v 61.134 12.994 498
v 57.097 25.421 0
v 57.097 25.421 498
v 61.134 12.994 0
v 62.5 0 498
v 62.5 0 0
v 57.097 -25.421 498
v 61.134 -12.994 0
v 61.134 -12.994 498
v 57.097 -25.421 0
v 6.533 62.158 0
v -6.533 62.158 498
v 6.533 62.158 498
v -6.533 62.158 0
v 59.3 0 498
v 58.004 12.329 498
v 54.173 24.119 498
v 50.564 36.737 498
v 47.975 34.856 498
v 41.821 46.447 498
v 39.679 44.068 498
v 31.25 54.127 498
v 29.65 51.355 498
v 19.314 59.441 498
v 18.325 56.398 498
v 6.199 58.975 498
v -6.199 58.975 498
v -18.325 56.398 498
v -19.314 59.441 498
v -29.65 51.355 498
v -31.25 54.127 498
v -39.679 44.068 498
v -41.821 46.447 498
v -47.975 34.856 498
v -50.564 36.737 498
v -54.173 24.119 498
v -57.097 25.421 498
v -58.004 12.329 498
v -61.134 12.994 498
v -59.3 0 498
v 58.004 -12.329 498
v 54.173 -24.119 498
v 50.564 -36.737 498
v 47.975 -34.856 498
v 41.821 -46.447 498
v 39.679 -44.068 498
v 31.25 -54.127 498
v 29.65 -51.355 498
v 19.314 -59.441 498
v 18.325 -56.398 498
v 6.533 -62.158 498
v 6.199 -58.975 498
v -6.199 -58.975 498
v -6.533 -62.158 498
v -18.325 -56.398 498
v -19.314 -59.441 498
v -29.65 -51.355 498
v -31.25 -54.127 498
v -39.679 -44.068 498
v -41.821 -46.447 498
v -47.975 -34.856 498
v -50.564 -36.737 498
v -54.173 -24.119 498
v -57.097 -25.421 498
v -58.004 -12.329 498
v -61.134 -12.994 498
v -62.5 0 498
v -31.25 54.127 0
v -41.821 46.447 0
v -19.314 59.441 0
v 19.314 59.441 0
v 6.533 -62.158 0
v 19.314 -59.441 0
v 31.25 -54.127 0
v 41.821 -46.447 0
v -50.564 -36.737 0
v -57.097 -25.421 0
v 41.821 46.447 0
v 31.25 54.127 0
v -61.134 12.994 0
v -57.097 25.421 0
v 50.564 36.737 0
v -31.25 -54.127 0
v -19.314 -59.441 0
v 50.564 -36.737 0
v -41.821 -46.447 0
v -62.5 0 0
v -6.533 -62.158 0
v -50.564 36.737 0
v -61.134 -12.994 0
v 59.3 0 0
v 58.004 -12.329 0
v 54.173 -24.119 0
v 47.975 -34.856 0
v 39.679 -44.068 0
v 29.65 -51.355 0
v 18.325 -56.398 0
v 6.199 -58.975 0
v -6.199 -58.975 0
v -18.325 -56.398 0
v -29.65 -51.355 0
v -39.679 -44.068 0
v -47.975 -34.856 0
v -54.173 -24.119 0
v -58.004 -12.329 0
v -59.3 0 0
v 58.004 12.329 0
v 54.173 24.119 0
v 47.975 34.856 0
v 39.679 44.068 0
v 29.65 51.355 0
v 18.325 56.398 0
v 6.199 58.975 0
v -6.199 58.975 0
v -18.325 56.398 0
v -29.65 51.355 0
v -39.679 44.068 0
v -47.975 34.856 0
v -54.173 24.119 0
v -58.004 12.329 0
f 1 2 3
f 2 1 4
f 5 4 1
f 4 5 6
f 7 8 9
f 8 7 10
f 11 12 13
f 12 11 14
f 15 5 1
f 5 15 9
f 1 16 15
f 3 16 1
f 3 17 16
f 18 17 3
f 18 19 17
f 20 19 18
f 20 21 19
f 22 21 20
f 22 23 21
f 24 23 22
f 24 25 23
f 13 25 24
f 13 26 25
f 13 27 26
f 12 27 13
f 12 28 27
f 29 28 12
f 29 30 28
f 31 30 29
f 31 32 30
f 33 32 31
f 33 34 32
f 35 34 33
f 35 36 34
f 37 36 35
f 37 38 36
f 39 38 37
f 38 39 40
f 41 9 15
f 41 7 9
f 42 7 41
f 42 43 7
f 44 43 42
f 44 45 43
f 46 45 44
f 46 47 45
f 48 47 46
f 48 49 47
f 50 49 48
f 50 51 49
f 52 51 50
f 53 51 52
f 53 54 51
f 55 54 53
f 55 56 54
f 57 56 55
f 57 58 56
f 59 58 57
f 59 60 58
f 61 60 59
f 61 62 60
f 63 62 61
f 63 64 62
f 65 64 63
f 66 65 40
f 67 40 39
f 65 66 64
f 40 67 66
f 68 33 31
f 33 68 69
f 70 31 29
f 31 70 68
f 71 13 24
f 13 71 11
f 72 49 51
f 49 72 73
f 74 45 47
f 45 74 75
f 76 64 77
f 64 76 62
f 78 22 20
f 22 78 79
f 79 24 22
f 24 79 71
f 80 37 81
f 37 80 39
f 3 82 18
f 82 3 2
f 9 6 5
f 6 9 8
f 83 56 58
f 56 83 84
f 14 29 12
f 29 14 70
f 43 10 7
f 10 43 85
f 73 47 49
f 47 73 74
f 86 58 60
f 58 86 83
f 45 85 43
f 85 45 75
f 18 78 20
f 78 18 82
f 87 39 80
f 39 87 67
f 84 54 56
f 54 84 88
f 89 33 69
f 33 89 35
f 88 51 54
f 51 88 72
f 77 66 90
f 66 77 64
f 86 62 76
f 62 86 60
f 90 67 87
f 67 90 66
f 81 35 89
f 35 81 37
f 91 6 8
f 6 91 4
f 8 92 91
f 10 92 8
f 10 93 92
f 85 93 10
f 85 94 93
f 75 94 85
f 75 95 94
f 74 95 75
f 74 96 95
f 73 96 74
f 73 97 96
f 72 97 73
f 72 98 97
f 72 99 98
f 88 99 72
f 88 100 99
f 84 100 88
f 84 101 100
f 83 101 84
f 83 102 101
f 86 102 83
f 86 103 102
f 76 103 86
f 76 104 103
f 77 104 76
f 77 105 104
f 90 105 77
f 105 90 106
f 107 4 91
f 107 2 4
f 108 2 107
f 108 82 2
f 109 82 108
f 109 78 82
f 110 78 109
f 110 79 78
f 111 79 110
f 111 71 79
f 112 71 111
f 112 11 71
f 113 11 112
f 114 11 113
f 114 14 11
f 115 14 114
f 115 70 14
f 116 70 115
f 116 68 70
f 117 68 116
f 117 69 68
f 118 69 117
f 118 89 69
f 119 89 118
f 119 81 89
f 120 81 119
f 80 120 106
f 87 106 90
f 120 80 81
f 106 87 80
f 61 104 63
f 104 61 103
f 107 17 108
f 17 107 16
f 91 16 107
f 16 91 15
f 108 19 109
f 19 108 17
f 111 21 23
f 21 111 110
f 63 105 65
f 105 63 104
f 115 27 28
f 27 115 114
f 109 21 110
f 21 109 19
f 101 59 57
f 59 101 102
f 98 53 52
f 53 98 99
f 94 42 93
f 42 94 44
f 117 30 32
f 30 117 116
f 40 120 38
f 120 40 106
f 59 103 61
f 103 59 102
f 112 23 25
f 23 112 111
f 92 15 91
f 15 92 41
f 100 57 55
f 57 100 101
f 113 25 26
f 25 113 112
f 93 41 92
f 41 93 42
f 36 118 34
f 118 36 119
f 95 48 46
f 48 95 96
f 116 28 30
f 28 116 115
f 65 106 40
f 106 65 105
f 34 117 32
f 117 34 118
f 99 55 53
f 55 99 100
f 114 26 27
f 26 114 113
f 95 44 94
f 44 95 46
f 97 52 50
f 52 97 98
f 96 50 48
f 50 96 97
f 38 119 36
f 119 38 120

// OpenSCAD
// Parameters
pipe_standard = 1; //[1:1:1]
nominal_diameter_mm = 125; //[63:250:1]
length_mm = 500; //[250:1000:1]
pipe_od_mm = 125; //[63:250:1]
wall_thickness_mm = 3.2; //[1.6:6.4:0.1]
fitting_socket_length_mm = 60; //[30:120:1]
fitting_socket_wall_extra_mm = 2.5; //[1:6:0.1]
fitting_stop_ring_thickness_mm = 4; //[2:10:0.5]
fitting_stop_ring_radial_mm = 2; //[1:6:0.5]
fitting_lead_in_length_mm = 10; //[5:25:1]
include_end_fitting = 1; //[0:1:1]
overlap_mm = 1; //[0.5:2:0.1]

// Module for HT Pipe
module ht_pipe() {
  color([0.85, 0.85, 0.8]) { // PVC color
    difference() {
      // Outer pipe segment
      cylinder(h=length_mm, r=pipe_od_mm/2, center=false);
      
      // Inner void of the pipe
      translate([0, 0, -overlap_mm])
        cylinder(h=length_mm + overlap_mm*2, r=pipe_od_mm/2 - wall_thickness_mm, center=false);
      
      if (include_end_fitting) {
        // End fitting socket outer
        translate([0, 0, length_mm - overlap_mm])
          cylinder(h=fitting_socket_length_mm, r=pipe_od_mm/2 + fitting_socket_wall_extra_mm, center=false);
        
        // End fitting socket inner void
        translate([0, 0, length_mm - overlap_mm*2])
          cylinder(h=fitting_socket_length_mm + overlap_mm*2, r=pipe_od_mm/2, center=false);
        
        // End fitting stop ring void
        translate([0, 0, length_mm + fitting_socket_length_mm - fitting_stop_ring_thickness_mm - overlap_mm])
          cylinder(h=fitting_stop_ring_thickness_mm + overlap_mm*2, r=pipe_od_mm/2 - wall_thickness_mm - fitting_stop_ring_radial_mm, center=false);
        
        // End fitting lead-in cone void
        translate([0, 0, length_mm + fitting_socket_length_mm - fitting_lead_in_length_mm])
          cylinder(h=fitting_lead_in_length_mm, r1=pipe_od_mm/2 + fitting_socket_wall_extra_mm, r2=pipe_od_mm/2, center=false);
      }
    }
  }
}

// Assembly
module assembly() {
  ht_pipe();
}

assembly();
